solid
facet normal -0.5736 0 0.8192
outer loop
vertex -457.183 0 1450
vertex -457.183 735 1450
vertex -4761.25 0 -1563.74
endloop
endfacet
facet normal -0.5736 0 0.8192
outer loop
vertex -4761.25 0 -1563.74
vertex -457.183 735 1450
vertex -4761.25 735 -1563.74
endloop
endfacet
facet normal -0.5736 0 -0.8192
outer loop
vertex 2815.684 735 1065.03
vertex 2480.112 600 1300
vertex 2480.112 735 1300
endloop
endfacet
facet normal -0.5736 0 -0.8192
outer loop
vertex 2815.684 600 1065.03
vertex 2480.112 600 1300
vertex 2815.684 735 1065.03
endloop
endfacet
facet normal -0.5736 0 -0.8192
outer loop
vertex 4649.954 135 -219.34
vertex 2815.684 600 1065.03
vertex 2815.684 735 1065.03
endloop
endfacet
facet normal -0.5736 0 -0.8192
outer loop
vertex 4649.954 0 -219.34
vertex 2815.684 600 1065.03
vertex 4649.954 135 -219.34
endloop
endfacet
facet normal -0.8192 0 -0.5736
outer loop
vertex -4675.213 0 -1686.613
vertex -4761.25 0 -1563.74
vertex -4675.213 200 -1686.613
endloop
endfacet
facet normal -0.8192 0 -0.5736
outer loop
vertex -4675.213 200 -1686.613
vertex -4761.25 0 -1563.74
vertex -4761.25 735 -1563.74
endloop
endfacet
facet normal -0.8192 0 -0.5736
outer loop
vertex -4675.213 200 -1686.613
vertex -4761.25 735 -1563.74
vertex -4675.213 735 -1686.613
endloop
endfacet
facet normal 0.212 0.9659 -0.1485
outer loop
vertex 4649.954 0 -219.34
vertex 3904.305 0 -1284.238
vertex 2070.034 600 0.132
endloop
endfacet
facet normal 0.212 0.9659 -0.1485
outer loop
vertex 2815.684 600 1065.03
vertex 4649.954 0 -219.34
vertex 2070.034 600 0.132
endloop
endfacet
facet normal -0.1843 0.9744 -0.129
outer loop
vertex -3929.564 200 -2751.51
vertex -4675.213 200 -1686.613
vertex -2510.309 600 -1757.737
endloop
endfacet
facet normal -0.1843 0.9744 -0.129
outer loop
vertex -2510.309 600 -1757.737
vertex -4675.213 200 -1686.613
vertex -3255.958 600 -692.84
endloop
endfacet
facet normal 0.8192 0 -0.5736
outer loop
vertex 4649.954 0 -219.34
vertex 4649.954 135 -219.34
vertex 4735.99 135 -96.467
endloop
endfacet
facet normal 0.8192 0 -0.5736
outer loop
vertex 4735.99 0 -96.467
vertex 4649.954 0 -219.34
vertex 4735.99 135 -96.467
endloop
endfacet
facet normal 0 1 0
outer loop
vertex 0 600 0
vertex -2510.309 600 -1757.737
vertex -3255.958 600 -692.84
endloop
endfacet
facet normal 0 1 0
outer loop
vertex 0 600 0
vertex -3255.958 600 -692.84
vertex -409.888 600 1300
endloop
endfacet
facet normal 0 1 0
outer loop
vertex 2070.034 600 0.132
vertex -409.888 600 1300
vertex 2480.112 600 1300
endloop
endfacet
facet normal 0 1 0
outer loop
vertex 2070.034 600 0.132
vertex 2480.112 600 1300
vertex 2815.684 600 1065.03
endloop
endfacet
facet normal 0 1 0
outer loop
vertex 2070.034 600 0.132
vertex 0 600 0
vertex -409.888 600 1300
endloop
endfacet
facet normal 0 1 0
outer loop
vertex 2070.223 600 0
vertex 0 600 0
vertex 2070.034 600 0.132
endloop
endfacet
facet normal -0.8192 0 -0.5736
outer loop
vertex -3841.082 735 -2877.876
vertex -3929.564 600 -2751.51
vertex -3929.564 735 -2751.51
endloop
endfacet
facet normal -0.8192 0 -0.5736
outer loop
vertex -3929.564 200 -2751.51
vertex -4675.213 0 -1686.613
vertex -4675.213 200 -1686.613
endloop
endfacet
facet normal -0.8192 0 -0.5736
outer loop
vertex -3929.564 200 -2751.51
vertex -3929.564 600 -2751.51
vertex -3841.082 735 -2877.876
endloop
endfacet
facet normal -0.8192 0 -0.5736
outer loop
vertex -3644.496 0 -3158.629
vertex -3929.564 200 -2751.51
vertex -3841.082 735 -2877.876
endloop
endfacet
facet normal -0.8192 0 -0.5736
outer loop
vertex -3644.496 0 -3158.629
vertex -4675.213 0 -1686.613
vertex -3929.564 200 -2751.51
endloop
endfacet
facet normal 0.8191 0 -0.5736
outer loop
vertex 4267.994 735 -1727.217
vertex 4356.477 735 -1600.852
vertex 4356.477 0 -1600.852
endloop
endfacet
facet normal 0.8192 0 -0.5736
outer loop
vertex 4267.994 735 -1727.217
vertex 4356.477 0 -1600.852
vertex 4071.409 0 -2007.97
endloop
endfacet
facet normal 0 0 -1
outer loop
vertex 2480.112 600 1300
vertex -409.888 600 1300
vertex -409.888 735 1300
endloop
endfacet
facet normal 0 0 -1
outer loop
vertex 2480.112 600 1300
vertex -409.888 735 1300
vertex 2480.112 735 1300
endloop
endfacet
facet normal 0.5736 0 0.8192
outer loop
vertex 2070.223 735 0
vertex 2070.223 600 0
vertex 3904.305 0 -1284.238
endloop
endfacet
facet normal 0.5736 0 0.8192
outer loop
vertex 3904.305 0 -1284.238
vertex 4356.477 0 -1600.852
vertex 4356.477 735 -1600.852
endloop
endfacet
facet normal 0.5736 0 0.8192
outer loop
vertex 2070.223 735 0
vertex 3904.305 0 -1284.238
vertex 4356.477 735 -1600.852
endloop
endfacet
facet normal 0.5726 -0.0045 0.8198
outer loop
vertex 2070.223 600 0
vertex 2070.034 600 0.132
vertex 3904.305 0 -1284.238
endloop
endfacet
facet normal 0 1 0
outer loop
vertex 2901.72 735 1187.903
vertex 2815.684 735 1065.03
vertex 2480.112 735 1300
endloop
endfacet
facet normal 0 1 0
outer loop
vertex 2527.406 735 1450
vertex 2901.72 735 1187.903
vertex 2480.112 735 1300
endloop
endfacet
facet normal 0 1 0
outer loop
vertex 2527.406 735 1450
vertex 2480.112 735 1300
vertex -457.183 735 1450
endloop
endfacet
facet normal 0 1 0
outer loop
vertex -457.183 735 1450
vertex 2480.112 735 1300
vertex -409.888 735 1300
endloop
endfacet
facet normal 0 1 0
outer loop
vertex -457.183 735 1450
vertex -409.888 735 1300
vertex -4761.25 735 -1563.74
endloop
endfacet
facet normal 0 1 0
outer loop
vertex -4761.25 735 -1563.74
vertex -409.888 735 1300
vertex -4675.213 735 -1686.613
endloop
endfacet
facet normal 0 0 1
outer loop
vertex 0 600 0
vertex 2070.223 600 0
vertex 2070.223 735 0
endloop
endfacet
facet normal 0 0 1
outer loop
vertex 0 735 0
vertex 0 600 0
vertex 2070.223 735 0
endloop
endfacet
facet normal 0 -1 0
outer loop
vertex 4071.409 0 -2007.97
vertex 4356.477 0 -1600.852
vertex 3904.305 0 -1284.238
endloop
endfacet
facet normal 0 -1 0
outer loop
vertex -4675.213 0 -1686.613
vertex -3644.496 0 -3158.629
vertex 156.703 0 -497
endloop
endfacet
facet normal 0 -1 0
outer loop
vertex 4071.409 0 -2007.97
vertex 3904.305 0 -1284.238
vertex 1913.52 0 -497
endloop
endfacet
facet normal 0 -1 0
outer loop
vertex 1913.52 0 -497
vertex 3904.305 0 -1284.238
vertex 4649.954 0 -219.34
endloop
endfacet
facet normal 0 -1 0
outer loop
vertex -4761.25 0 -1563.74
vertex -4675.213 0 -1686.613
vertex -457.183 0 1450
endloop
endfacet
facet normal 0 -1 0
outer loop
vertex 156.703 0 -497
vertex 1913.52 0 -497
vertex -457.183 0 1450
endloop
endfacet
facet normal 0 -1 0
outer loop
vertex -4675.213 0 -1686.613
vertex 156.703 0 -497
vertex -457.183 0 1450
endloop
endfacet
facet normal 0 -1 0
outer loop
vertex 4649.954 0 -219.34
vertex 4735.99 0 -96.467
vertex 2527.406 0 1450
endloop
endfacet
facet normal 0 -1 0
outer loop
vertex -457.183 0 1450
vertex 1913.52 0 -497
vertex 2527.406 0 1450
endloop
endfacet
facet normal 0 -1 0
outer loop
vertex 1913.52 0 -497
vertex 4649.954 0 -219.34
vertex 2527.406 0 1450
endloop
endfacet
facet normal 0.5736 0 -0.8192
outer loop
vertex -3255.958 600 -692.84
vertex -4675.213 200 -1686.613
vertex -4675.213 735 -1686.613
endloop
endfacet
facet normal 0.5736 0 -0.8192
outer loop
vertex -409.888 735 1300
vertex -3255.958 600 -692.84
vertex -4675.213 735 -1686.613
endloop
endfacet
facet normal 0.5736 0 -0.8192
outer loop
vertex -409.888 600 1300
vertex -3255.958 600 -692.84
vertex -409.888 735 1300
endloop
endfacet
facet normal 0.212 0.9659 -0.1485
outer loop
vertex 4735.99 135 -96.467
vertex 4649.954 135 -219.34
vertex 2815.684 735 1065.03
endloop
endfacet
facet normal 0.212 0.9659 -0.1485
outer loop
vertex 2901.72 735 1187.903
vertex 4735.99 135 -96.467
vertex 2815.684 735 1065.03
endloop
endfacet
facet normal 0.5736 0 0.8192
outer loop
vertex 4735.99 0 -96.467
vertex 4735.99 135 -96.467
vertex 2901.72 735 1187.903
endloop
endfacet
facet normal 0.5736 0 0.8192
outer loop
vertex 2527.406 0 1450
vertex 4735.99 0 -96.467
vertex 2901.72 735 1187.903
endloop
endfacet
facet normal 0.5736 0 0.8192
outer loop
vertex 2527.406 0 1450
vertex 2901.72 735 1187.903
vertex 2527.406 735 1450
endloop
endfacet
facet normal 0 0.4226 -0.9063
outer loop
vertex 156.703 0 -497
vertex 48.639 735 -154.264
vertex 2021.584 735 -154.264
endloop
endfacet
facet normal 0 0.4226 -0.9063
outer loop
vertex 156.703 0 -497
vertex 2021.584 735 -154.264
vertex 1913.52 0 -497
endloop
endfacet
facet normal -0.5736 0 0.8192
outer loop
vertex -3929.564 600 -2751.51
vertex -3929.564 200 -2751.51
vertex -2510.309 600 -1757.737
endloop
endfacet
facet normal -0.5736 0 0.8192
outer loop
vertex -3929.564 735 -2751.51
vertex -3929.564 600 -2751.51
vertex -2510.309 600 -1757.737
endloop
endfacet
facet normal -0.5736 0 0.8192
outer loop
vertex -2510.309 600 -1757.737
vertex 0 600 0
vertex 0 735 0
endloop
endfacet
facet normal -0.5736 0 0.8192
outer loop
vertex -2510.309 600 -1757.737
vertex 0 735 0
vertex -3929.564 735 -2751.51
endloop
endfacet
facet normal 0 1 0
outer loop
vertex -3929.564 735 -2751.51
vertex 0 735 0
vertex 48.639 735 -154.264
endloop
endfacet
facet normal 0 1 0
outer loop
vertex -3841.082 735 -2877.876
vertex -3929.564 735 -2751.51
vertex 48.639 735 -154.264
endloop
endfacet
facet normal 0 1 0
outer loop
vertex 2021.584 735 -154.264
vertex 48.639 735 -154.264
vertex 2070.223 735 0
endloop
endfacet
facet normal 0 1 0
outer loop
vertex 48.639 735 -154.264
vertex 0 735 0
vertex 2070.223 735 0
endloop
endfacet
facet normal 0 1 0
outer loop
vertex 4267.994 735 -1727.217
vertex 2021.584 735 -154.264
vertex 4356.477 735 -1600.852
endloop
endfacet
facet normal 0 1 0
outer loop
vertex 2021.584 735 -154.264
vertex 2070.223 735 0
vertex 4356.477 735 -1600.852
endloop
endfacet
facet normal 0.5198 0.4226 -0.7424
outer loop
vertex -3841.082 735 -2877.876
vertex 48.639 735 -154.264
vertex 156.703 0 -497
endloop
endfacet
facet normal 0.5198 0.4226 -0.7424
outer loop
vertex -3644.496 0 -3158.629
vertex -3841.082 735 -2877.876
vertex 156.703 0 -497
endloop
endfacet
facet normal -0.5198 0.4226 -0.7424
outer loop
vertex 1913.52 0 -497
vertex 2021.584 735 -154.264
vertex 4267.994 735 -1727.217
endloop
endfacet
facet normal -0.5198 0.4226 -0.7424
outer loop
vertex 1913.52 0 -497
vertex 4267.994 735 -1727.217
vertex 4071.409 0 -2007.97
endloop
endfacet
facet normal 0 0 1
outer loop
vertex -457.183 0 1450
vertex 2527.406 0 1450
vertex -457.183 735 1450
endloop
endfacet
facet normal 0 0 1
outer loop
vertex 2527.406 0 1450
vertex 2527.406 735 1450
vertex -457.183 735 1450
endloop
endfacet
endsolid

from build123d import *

# Parameters (mm, degrees)
EXTRUDE_1_DEPTH      = 600
EXTRUDE_2_DEPTH      = 135
EXTRUDE_2_DEPTH_BACK = 600
CUT_EXTRUDE_1_DEPTH  = 1300
CUT_EXTRUDE_2_DEPTH  = 8114.690330729
CUT_EXTRUDE_3_DEPTH  = 1300


with BuildPart() as part:
    # 草图1 → 凸台-拉伸1 (new body)
    with BuildSketch(Plane(origin=(0, 0, 0), x_dir=(1, 0, 0), z_dir=(0, 1, 0))):
        Polygon((2815.872516171, -1064.897657576), (2070.223148915, 0), (0, 0), (-3929.563752899, 2751.510161656), (-4675.213120155, 1686.61250408), (-409.888425543, -1300), (2480.111574457, -1300), align=None)
        Polygon((4649.953943334, 219.339983414), (3904.304576078, 1284.23764099), (2070.223148915, 0), (2815.872516171, -1064.897657576), align=None)
    extrude(amount=EXTRUDE_1_DEPTH)

    # 草图2 → 凸台-拉伸2 (add, two sides)
    with BuildSketch(Plane(origin=(0, 600, 0), x_dir=(1, 0, 0), z_dir=(0, 1, 0))) as extrude_2_sk:
        Polygon((4649.953943334, 219.339983414), (4735.990408787, 96.467176771), (2527.406392789, -1450), (-457.183243875, -1450), (-4761.249585608, 1563.739697437), (-4675.213120155, 1686.61250408), (-409.888425543, -1300), (2480.111574457, -1300), align=None)
    extrude(amount=EXTRUDE_2_DEPTH)
    extrude(extrude_2_sk.sketch, amount=-EXTRUDE_2_DEPTH_BACK)

    # 扫描1: sweep along a path in 草图4
    with BuildLine(Plane(origin=(0, 600, 0), x_dir=(1, 0, 0), z_dir=(0, 1, 0))) as sweep_1_path:
        Line((-3929.563752899, 2751.510161656), (0, 0))
        Line((0, 0), (2070.223148915, 0))
        Line((2070.223148915, 0), (4356.476504525, 1600.851833856))
    # 草图3 → 扫描1 (sweep)
    with BuildSketch(Plane(origin=(-3929.563752899, 0, -2751.510161656), x_dir=(-0.5735764363510467, 0, 0.8191520442889915), z_dir=(-0.8191520442889914, 0, -0.5735764363510466))):
        Polygon((0, 0), (0, 735), (-154.263871256, 735), (-497, 0), align=None)
    sweep(path=sweep_1_path.line, transition=Transition.RIGHT)

    # 草图5 → 切除-拉伸1 (cut)
    with BuildSketch(Plane(origin=(681.082565403, 0, 972.686708208), x_dir=(0.8191520442889921, 2.43053022929219e-15, -0.5735764363510456), z_dir=(0.5735764363510456, -3.4711569022901e-15, 0.8191520442889921))):
        Polygon((3934.827524568, 0), (1695.597040027, 600), (3934.827524568, 600), align=None)
    extrude(amount=CUT_EXTRUDE_1_DEPTH, mode=Mode.SUBTRACT)

    # 草图7 → 切除-拉伸2 (cut, through all)
    with BuildSketch(Plane(origin=(1426.73193266, 0, 2037.584365783), x_dir=(-0.8191520442889908, 0, 0.5735764363510475), z_dir=(-0.5735764363510475, 0, -0.8191520442889908))):
        Polygon((-3934.827524568, 135), (-1695.597040026, 735), (-3934.827524568, 735), align=None)
    extrude(amount=-CUT_EXTRUDE_2_DEPTH, mode=Mode.SUBTRACT)

    # 草图8 → 切除-拉伸3 (cut)
    with BuildSketch(Plane(origin=(-745.649367256, 0, 1064.897657576), x_dir=(-0.8191520442889912, 0, -0.5735764363510469), z_dir=(0.5735764363510469, 0, -0.8191520442889914))):
        Polygon((4797.111574457, 200), (2479.771981715, 735), (4797.111574457, 735), align=None)
    extrude(amount=CUT_EXTRUDE_3_DEPTH, mode=Mode.SUBTRACT)


solid = part.part
